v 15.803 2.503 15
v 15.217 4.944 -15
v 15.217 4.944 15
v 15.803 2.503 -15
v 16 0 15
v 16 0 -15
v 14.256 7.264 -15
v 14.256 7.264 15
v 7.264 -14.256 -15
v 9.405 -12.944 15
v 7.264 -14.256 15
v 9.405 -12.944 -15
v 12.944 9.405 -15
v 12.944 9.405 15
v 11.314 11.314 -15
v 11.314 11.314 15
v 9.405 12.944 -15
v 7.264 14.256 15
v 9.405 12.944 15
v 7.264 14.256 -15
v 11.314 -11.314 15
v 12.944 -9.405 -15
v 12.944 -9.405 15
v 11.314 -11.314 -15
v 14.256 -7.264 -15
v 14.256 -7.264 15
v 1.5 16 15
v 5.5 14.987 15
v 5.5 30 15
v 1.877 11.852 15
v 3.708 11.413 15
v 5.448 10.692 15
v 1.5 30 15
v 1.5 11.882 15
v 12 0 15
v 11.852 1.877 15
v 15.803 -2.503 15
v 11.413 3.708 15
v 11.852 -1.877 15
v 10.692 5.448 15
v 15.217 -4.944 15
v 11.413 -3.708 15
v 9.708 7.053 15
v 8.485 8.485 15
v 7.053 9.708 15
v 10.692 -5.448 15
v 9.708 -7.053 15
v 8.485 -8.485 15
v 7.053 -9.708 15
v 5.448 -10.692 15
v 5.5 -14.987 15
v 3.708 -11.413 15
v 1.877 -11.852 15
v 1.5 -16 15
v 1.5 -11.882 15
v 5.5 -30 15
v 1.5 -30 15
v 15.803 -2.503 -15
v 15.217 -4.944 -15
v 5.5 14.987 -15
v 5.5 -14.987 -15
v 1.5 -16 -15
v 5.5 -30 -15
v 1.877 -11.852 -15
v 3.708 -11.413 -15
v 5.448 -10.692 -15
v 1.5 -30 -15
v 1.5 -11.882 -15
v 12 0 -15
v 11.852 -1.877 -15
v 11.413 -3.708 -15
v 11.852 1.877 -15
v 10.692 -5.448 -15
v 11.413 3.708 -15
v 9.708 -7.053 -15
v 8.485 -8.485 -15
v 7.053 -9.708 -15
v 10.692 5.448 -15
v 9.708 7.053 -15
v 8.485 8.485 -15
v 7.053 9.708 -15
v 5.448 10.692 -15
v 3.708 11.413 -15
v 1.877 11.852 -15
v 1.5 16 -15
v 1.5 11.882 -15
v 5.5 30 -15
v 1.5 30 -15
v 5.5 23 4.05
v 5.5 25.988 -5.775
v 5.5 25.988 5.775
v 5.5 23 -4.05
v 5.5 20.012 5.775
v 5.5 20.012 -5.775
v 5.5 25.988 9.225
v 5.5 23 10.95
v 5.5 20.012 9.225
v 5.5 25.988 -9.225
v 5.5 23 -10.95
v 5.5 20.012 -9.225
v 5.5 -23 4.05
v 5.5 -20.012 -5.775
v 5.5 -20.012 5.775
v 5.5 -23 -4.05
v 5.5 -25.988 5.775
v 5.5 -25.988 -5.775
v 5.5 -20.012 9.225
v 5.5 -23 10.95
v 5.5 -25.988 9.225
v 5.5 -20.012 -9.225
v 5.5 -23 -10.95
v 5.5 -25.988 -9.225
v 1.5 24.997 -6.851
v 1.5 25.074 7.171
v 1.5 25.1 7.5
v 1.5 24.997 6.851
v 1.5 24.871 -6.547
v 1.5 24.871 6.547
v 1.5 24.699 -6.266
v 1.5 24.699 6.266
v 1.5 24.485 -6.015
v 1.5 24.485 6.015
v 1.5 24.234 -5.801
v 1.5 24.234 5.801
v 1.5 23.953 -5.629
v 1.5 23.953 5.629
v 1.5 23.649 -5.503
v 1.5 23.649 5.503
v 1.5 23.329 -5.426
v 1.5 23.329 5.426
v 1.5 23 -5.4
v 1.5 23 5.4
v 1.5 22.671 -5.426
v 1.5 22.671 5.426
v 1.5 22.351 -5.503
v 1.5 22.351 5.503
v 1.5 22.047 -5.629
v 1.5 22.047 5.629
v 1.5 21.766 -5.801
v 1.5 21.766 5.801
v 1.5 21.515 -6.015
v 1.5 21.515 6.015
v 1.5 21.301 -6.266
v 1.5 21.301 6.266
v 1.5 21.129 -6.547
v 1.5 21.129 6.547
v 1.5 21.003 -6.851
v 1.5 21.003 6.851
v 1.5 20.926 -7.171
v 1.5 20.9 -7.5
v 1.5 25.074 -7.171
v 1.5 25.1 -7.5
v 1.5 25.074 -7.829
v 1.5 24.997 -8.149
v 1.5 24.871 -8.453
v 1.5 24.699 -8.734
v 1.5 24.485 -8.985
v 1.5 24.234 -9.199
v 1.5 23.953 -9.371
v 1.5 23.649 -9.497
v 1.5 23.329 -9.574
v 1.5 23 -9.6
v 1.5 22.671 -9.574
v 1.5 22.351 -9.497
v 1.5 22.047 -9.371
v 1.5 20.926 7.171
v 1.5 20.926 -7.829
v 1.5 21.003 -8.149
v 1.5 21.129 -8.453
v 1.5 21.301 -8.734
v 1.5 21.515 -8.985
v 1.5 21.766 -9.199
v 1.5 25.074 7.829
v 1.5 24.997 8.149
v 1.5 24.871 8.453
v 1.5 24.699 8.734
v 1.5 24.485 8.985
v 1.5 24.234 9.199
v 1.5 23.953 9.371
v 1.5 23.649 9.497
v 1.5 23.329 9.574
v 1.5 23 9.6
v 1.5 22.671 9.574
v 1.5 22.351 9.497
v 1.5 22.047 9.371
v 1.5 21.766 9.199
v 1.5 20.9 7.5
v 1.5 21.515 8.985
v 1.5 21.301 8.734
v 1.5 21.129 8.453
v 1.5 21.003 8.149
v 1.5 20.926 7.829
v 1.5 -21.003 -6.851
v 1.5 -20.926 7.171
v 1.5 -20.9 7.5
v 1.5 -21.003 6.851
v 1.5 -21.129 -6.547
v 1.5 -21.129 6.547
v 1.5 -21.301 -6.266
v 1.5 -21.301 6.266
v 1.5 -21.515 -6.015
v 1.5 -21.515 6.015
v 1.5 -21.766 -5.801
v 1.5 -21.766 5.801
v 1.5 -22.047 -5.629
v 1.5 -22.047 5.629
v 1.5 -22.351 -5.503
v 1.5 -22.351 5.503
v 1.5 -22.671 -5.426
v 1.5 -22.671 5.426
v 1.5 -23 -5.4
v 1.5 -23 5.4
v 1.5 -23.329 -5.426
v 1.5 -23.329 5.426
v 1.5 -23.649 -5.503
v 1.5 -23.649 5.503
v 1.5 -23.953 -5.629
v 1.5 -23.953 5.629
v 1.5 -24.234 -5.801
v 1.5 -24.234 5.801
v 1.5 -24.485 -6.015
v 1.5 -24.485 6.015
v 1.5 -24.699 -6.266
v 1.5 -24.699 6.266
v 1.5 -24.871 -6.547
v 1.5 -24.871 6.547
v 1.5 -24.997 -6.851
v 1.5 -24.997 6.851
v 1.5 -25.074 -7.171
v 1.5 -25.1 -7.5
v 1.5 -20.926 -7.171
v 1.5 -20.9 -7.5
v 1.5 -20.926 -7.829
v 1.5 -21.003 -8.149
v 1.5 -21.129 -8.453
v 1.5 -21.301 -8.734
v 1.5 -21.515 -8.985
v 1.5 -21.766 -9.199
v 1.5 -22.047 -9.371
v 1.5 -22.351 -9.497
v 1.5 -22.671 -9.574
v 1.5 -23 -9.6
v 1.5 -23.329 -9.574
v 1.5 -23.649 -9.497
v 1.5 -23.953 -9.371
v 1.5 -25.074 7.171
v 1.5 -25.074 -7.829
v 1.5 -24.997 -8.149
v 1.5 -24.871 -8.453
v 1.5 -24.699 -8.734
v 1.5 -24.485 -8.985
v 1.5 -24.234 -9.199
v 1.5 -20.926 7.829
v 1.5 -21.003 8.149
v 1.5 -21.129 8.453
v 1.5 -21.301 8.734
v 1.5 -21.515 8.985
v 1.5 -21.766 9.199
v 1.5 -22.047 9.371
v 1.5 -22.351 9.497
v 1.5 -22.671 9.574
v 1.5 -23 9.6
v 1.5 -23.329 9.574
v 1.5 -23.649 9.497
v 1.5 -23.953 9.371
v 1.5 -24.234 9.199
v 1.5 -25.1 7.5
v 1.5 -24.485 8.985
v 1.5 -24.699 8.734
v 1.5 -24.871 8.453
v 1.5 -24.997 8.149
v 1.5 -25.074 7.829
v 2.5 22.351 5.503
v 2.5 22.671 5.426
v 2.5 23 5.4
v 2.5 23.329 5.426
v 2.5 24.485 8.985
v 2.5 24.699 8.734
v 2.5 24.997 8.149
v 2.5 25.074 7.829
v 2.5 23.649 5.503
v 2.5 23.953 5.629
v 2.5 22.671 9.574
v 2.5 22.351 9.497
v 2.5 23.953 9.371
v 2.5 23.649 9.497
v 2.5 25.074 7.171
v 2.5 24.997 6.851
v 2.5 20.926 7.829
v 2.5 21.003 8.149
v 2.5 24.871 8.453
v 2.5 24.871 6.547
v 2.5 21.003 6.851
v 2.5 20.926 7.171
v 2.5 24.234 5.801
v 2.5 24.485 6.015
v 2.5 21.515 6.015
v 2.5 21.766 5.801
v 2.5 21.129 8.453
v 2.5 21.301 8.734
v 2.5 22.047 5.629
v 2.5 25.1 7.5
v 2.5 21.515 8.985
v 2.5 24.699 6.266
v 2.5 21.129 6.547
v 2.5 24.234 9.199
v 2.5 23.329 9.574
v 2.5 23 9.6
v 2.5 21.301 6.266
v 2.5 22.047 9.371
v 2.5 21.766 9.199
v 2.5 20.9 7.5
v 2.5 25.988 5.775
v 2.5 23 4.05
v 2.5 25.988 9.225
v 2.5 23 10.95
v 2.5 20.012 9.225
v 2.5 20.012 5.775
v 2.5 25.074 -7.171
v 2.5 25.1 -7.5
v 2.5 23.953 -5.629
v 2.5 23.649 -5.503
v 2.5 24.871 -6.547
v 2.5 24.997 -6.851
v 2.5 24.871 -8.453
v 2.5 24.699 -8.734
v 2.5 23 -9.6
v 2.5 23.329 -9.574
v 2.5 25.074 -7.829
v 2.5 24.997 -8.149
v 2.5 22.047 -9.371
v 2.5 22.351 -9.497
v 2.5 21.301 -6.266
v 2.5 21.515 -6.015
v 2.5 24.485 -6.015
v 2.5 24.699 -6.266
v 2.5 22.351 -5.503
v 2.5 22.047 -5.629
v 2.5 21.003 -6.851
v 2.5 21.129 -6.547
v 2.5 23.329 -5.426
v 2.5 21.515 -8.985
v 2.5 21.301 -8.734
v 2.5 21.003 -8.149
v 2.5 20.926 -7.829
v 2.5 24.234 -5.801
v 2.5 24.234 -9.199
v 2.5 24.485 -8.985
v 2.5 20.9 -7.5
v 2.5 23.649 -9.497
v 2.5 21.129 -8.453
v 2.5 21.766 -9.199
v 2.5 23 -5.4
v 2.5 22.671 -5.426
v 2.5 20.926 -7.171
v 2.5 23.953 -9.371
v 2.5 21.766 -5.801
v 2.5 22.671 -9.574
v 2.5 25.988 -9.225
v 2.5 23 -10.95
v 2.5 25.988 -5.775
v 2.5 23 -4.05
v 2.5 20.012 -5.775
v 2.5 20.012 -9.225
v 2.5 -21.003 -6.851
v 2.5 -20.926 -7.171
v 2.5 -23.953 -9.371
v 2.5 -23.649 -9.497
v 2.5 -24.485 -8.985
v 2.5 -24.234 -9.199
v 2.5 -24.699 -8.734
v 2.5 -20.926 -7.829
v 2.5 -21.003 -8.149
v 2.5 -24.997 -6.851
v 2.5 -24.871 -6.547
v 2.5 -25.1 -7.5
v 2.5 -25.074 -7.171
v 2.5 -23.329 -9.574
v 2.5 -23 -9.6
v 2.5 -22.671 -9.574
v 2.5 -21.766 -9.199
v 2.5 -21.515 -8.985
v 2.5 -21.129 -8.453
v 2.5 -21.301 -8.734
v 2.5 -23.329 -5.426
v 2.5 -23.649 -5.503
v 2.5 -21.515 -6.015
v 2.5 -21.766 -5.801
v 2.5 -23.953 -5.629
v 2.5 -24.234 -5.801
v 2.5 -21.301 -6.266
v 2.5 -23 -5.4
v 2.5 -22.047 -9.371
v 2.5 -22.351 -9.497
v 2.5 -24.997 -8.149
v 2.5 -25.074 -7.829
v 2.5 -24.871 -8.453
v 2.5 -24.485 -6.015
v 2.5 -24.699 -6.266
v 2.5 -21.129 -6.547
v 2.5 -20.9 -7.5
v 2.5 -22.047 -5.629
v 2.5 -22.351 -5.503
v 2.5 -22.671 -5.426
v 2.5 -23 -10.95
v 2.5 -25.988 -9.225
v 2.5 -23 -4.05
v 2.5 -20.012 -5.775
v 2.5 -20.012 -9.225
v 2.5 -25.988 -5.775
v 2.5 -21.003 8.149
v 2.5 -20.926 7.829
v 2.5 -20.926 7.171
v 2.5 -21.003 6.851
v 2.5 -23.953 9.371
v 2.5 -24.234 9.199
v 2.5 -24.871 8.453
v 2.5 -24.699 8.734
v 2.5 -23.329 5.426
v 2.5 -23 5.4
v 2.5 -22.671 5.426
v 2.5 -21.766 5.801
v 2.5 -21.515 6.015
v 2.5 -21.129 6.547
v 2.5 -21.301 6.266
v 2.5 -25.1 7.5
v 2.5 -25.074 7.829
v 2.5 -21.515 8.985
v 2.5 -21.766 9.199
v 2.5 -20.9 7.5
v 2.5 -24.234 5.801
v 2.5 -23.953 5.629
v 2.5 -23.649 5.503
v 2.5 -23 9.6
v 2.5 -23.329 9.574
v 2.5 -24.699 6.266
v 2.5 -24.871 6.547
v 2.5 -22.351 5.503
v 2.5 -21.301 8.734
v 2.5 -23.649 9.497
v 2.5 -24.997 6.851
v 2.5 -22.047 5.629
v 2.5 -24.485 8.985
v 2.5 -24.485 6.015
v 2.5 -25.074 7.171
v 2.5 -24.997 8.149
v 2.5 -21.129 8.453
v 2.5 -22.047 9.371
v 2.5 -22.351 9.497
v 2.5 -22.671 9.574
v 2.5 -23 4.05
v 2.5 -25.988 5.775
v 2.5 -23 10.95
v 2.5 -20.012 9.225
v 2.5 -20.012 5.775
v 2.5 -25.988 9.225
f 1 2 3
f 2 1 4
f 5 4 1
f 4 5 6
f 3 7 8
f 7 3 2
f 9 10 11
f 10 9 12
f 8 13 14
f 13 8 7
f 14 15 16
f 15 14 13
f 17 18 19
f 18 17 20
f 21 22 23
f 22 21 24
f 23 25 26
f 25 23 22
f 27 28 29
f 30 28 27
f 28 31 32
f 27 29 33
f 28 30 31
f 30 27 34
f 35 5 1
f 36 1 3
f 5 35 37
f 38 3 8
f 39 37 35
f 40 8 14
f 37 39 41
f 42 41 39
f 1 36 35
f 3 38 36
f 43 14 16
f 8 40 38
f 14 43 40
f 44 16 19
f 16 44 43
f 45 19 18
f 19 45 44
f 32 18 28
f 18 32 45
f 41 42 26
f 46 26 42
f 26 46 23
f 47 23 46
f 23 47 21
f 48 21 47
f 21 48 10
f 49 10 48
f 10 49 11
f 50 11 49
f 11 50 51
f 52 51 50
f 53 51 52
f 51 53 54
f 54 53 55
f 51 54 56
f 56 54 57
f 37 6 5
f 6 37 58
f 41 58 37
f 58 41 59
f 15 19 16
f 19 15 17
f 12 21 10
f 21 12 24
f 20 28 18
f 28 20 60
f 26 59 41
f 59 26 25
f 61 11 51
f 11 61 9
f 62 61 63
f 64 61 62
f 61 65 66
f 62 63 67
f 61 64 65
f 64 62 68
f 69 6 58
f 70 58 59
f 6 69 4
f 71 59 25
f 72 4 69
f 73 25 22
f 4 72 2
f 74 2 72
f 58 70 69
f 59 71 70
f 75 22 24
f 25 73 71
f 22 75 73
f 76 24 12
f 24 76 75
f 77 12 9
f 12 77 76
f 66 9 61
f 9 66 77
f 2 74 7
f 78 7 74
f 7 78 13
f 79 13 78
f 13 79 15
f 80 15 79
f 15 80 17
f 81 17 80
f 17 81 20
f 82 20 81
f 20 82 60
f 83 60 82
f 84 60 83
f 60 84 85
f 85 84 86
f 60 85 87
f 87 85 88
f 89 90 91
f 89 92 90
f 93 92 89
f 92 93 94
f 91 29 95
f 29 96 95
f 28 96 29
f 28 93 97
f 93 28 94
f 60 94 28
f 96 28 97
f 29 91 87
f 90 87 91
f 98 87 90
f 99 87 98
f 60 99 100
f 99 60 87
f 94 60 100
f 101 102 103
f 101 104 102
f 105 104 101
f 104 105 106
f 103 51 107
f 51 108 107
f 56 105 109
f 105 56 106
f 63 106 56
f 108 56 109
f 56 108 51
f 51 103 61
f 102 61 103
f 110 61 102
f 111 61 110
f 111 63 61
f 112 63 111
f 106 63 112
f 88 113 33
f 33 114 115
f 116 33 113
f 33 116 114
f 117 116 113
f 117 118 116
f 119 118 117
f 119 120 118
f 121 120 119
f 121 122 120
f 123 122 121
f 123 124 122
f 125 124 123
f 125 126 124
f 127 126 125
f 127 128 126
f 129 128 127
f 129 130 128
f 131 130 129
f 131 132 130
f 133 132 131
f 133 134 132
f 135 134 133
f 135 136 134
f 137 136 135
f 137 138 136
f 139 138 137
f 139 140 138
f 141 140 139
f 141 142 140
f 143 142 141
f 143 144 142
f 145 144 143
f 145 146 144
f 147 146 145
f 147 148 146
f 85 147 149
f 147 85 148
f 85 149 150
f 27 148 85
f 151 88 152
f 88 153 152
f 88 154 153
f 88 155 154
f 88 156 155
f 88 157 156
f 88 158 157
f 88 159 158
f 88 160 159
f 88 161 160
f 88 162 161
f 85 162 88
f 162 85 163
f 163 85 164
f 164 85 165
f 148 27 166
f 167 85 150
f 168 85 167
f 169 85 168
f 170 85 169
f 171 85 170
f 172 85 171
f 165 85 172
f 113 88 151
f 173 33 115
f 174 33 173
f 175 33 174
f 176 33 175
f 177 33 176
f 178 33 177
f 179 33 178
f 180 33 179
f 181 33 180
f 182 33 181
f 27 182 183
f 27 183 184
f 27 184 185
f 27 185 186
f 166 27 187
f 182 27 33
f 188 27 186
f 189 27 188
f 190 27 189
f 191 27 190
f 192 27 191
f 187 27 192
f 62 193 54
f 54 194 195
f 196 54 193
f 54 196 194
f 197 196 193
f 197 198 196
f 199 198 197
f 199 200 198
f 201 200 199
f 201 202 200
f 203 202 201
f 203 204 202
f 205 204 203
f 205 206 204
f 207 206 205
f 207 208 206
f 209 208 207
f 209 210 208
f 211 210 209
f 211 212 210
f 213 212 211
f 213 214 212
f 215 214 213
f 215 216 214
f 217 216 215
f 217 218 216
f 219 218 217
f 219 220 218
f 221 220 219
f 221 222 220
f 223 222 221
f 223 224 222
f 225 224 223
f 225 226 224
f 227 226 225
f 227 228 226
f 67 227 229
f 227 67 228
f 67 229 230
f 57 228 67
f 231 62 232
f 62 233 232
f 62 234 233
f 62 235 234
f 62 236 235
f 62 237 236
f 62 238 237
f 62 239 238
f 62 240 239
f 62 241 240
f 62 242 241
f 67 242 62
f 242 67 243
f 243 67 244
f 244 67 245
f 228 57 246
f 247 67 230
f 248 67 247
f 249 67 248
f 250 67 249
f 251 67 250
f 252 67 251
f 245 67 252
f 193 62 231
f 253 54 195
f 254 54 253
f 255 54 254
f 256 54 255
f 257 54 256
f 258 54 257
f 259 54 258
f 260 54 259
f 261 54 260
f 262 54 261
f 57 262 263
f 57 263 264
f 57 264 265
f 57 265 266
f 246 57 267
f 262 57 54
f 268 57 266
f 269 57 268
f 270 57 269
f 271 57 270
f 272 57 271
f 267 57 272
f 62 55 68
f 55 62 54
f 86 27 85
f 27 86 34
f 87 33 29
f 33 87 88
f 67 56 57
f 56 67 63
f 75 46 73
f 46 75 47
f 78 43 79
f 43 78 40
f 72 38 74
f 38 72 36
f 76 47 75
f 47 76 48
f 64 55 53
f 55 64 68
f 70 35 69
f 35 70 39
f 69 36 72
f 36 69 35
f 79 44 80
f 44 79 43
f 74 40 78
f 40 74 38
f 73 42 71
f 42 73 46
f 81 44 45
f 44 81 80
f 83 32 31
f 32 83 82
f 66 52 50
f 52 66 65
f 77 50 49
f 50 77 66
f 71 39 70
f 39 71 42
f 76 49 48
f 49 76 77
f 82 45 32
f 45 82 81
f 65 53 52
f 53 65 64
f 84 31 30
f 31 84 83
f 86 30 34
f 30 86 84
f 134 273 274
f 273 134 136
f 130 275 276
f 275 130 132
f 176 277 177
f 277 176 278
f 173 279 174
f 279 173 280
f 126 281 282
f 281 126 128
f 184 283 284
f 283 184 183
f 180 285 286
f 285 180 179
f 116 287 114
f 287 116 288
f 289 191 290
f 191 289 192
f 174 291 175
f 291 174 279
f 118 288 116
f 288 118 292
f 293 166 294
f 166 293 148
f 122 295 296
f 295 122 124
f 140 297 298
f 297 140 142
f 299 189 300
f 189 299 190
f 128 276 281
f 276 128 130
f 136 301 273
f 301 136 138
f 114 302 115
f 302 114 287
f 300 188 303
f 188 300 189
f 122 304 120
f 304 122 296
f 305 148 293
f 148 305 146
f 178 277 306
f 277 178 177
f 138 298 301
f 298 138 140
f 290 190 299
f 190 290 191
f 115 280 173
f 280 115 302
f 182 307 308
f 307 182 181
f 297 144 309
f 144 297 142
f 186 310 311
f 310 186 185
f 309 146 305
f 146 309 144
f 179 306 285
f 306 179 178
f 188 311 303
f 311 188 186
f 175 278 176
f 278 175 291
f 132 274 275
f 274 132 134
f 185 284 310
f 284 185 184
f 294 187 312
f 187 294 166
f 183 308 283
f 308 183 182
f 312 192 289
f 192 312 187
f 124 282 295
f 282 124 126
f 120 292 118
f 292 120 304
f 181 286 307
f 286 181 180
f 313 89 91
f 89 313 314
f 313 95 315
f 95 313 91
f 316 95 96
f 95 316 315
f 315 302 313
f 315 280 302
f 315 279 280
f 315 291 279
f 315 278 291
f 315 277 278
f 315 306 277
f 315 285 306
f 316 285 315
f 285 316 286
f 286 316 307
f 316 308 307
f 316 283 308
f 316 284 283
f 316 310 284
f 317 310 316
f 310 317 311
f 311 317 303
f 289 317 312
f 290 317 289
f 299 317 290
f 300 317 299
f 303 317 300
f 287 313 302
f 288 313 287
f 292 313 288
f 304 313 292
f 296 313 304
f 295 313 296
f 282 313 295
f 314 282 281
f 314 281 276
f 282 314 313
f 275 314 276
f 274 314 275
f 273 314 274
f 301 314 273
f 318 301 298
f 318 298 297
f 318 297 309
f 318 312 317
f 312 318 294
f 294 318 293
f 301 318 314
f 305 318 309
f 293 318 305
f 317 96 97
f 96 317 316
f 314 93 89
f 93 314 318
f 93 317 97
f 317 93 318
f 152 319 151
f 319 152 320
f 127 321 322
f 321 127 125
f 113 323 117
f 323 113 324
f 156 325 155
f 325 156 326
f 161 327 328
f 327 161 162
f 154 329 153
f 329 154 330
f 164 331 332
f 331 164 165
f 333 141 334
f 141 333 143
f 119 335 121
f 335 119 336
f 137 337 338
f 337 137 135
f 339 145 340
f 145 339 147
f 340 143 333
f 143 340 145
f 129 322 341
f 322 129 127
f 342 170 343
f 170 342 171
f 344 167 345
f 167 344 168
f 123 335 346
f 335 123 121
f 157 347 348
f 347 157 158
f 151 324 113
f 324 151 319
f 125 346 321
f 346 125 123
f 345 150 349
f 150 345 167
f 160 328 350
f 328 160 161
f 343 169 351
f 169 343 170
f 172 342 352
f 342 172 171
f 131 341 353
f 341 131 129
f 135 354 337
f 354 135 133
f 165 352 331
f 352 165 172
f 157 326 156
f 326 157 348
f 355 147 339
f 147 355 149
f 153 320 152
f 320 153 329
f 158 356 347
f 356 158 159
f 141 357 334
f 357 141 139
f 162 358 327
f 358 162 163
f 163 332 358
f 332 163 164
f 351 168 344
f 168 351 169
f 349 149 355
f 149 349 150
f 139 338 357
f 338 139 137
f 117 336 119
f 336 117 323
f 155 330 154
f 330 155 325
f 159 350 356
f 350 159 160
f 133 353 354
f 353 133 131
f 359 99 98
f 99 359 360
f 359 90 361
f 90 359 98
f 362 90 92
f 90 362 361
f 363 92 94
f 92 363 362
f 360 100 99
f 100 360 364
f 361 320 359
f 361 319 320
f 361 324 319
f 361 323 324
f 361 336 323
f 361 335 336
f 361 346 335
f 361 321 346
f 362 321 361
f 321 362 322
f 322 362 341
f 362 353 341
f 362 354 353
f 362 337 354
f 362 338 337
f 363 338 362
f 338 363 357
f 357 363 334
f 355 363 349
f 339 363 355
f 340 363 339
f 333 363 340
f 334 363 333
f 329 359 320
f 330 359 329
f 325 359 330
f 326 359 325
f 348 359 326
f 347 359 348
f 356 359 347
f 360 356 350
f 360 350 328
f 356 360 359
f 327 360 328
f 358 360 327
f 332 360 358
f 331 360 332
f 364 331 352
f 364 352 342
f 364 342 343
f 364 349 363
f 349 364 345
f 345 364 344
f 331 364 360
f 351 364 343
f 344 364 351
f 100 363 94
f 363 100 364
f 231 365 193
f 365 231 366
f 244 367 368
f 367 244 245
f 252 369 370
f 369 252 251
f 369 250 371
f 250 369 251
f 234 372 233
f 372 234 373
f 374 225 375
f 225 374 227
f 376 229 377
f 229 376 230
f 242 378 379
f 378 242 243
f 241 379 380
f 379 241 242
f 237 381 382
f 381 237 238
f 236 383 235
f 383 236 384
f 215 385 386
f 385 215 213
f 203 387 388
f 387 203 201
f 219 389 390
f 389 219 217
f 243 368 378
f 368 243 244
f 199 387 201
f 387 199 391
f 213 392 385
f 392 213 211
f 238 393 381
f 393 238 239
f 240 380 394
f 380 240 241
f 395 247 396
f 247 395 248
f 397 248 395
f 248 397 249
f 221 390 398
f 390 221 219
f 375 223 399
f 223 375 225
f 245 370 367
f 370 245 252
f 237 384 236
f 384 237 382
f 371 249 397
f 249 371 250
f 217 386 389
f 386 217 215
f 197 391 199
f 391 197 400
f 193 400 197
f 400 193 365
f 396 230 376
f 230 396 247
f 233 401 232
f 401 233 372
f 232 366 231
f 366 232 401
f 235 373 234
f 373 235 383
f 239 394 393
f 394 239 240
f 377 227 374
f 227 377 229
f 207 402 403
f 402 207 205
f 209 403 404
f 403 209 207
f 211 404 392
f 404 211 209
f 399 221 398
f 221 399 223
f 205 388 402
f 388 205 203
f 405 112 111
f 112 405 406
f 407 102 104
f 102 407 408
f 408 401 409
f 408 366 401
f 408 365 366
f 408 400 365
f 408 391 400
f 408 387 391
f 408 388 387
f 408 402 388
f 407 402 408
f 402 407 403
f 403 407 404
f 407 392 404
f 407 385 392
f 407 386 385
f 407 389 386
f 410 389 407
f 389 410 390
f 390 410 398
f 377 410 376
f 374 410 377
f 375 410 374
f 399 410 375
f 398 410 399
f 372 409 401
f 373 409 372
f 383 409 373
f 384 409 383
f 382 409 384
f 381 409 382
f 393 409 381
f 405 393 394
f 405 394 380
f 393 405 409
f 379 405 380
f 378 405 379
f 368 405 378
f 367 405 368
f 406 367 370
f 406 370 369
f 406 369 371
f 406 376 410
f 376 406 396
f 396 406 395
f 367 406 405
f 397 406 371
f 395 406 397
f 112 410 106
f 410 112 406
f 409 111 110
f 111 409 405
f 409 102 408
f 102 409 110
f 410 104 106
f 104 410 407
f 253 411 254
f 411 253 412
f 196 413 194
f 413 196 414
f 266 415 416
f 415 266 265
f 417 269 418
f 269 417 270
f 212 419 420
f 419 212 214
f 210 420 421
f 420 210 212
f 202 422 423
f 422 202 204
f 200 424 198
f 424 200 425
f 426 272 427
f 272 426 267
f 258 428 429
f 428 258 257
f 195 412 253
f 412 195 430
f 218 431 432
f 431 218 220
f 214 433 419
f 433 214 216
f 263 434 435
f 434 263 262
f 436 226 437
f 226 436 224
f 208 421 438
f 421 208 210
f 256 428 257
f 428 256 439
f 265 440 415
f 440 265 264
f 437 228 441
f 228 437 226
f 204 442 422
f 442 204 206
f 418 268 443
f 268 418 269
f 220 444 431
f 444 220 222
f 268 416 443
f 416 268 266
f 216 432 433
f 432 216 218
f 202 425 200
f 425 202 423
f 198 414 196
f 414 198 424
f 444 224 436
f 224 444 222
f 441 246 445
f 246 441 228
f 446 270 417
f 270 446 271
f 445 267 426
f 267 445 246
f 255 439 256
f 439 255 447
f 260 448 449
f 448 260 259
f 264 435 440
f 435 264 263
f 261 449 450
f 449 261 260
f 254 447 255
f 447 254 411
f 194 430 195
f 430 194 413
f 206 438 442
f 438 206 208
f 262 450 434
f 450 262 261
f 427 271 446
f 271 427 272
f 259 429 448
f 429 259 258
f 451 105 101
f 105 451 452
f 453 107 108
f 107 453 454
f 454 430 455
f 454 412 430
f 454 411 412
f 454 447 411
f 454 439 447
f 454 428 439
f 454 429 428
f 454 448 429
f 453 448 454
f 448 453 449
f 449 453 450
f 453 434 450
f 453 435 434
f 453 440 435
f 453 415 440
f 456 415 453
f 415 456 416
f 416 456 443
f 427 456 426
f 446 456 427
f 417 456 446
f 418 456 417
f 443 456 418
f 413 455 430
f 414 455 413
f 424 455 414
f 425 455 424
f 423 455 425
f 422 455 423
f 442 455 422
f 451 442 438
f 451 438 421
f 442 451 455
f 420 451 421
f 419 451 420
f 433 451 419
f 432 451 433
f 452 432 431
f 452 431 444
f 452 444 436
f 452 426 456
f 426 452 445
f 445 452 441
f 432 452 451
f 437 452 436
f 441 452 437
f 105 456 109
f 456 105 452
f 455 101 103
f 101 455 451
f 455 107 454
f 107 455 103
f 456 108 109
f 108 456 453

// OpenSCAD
// file: ../configuration.scad
$fn=40; // model faces resolution.

//OBECNE PARAMETRY 
//----------------------------------------------------------------
//----------------------------------------------------------------
//WINDGAUGE02A_S02 - Parametry pro hlavni valec anemometru
S01_hloubka_zavitu=4;
S01_vyska=95; //80
S01_prumer_vnitrni=45;
S01_prumer_vnitrniB=30;
S01_prechod_vyska=45;
S01_prechod_delka=30;
S01_sila_materialu=1.3;
S01_vyska_horni_zavit=10;
S01_vyska_spodniho_zavitu=10;
S01_sila_drzaku_RJ11=3; //vyška drážky
S01_hrana_A_RJ11=12.3;
S01_hrana_B_RJ11=19;
S01_tolerance_zavit=1.5;

//Obecné parametry
prumer_osicky=5;
sterbina_na_osicku=0.5; //aby nepraskal a držel držák rotoru na hřídelce

//Rozmery modulu pro lozisko
senzor_delka=10.16*4;
senzor_sirka=10.16*3;
senzor_vyska_IO=2;
senzor_odstup_od_magnetu=2;

//Parametry loziska
lozisko_prumer_vnitrni=4.9;
lozisko_prumer_vnejsi=16.15;
lozisko_vyska=5*2;
lozisko_prekryv=1.5;

//Parametry magnetu
magnet_pocet=3;
magnet_prumer=6.3;
magnet_vyska=3;
magnet_zapusteni=2;
magnet_tolerance_prumeru=0.2;
magnet_vzdalenost = 9; // vzdalenost magnetu od stredu

R03_vyska_narezeni_hridelky=5;

//Parametry sroubu
prumer_sroubu=3.4;
prumer_hlavy_sroubu=6;
vyska_hlavy_sroubu=4;
vyska_matky=3;
sirka_matky=6.7;

sirka_matky_tol=0.175;
prumer_orechu=10;

//WINDGAUGE02A_R01 //pro lopatku
L01_hrana_drzaku_a=10;
L01_hrana_drzaku_b=3;
L01_delka_uchytu=25;
L01_prumer_lopatky=40;
L01_sila_materialu_lopatky=1.2;

//WINDGAUGE02A_D01 //uchyt velky
D01_material_pod_zavitem=5;
D01_material_za_zavitem=3;
D01_material_pred_zavitem=2;
D01_delka_tyce=60;
D01_sirka_tyce=10;

//WINDGAUGE02A_D02 //uchyt na sloup
D02_sila_materialu=4;
D02_vyska_uchytky=30;
D02_prumer_obruby=24; 

//27mm - 3/4 trubka
D02_delka_celeho_uchytu=60;
D02_dotahova_vzdalenost=1.5;
D02_prumer_uchytneho_sroubu=4.2;
//D02_sirka_matky=9.1; //pro M4
//D02_vyska_matky=3;
D02_sirka_matky= sirka_matky; //pro M3
D02_vyska_matky= vyska_matky;

//WINDGAUGE02A_R01 //rotor s prekritim statoru
R01_vyska_preryti_statoru=10;
R01_sila_materialu_pro_prekriti=1.3;
R01_mezera_mezi_statorem_rotorem=3;

//WINDGAUGE02A_R03 //drzak magnetu
R05_sirka_matky=10;
// main file
$fn=40; // model faces resolution.
include <../configuration.scad>


//Drzak na sloup - cast bez drzaku anemometru
module WINDGAUGE02A_D02(){
	
difference()
    {
    union()
        {
        //základní válec
        cylinder(h=D02_vyska_uchytky,r=(D02_prumer_obruby+2*D02_sila_materialu)/2,center=true);
		//úchytové plošky		
        translate([D02_dotahova_vzdalenost+D02_sila_materialu/2,0,0]){cube([D02_sila_materialu,D02_delka_celeho_uchytu,D02_vyska_uchytky],center=true);}
		}
    
    //válec na odečet
    cylinder(h=D02_vyska_uchytky+0.01,r=D02_prumer_obruby/2,center=true);     
	        
    //kvádr na odecet
	translate([D02_dotahova_vzdalenost-(D02_prumer_obruby+2*D02_sila_materialu)/2,0,0]){cube([D02_prumer_obruby+2*D02_sila_materialu,D02_prumer_obruby+2*D02_sila_materialu,D02_vyska_uchytky+0.01],center=true);}
		
	//otvory na sroub
	translate([D02_dotahova_vzdalenost,(D02_delka_celeho_uchytu/2-D02_prumer_obruby/2-D02_sila_materialu)/2+D02_prumer_obruby/2+D02_sila_materialu,D02_vyska_uchytky/4]){rotate([0,90,0]){cylinder(h=D02_sila_materialu+0.01,r=D02_prumer_uchytneho_sroubu/2);}}
    
     //drzak matky
    translate([D02_dotahova_vzdalenost+D02_sila_materialu-D02_vyska_matky,(D02_delka_celeho_uchytu/2-D02_prumer_obruby/2-D02_sila_materialu)/2+D02_prumer_obruby/2+D02_sila_materialu,D02_vyska_uchytky/4]){rotate([0,90,0]){ cylinder (h = D02_vyska_matky+0.01, r= (D02_sirka_matky+0.2)/2, $fn=6);}}
   
     
        
    translate([D02_dotahova_vzdalenost,(D02_delka_celeho_uchytu/2-D02_prumer_obruby/2-D02_sila_materialu)/2+D02_prumer_obruby/2+D02_sila_materialu,-D02_vyska_uchytky/4]){rotate([0,90,0]){cylinder(h=D02_sila_materialu+0.01,r=D02_prumer_uchytneho_sroubu/2);}}
    
     //drzak matky
    translate([D02_dotahova_vzdalenost+D02_sila_materialu-D02_vyska_matky,(D02_delka_celeho_uchytu/2-D02_prumer_obruby/2-D02_sila_materialu)/2+D02_prumer_obruby/2+D02_sila_materialu,-D02_vyska_uchytky/4]){rotate([0,90,0]){ cylinder (h = D02_vyska_matky+0.01, r= (D02_sirka_matky+0.2)/2, $fn=6);}}
        
	translate([D02_dotahova_vzdalenost,-((D02_delka_celeho_uchytu/2-D02_prumer_obruby/2-D02_sila_materialu)/2+D02_prumer_obruby/2+D02_sila_materialu),-D02_vyska_uchytky/4]){rotate([0,90,0]){cylinder(h=D02_sila_materialu+0.01,r=D02_prumer_uchytneho_sroubu/2);}}
    
     //drzak matky
    translate([D02_dotahova_vzdalenost+D02_sila_materialu-D02_vyska_matky,-((D02_delka_celeho_uchytu/2-D02_prumer_obruby/2-D02_sila_materialu)/2+D02_prumer_obruby/2+D02_sila_materialu),-D02_vyska_uchytky/4]){rotate([0,90,0]){ cylinder (h = D02_vyska_matky+0.01, r= (D02_sirka_matky+0.2)/2, $fn=6);}}

    translate([D02_dotahova_vzdalenost,-((D02_delka_celeho_uchytu/2-D02_prumer_obruby/2-D02_sila_materialu)/2+D02_prumer_obruby/2+D02_sila_materialu),D02_vyska_uchytky/4]){rotate([0,90,0]){cylinder(h=D02_sila_materialu+0.01,r=D02_prumer_uchytneho_sroubu/2);}}	
    
     //drzak matky
    translate([D02_dotahova_vzdalenost+D02_sila_materialu-D02_vyska_matky,-((D02_delka_celeho_uchytu/2-D02_prumer_obruby/2-D02_sila_materialu)/2+D02_prumer_obruby/2+D02_sila_materialu),D02_vyska_uchytky/4]){rotate([0,90,0]){ cylinder (h = D02_vyska_matky+0.01, r= (D02_sirka_matky+0.2)/2, $fn=6);}}
	
    }
}

module WINDGAUGE02A_D02_2(){
	
difference()
    {
    union()
        {
        //základní válec
        cylinder(h=D02_vyska_uchytky,r=(D02_prumer_obruby+2*D02_sila_materialu)/2,center=true);
		//úchytové plošky		
        translate([D02_dotahova_vzdalenost+D02_sila_materialu/2,0,0]){cube([D02_sila_materialu,D02_delka_celeho_uchytu,D02_vyska_uchytky],center=true);}
		}
    
    //válec na odečet
    cylinder(h=D02_vyska_uchytky+0.01,r=D02_prumer_obruby/2,center=true);     
	        
    //kvádr na odecet
	translate([D02_dotahova_vzdalenost-(D02_prumer_obruby+2*D02_sila_materialu)/2,0,0]){cube([D02_prumer_obruby+2*D02_sila_materialu,D02_prumer_obruby+2*D02_sila_materialu,D02_vyska_uchytky+0.01],center=true);}
		
	//otvory na sroub
	translate([D02_dotahova_vzdalenost,(D02_delka_celeho_uchytu/2-D02_prumer_obruby/2-D02_sila_materialu)/2+D02_prumer_obruby/2+D02_sila_materialu,D02_vyska_uchytky/4]){rotate([0,90,0]){cylinder(h=D02_sila_materialu+0.01,r=D02_prumer_uchytneho_sroubu/2);}}
    
    
   
     
        
    translate([D02_dotahova_vzdalenost,(D02_delka_celeho_uchytu/2-D02_prumer_obruby/2-D02_sila_materialu)/2+D02_prumer_obruby/2+D02_sila_materialu,-D02_vyska_uchytky/4]){rotate([0,90,0]){cylinder(h=D02_sila_materialu+0.01,r=D02_prumer_uchytneho_sroubu/2);}}
    
     
        
	translate([D02_dotahova_vzdalenost,-((D02_delka_celeho_uchytu/2-D02_prumer_obruby/2-D02_sila_materialu)/2+D02_prumer_obruby/2+D02_sila_materialu),-D02_vyska_uchytky/4]){rotate([0,90,0]){cylinder(h=D02_sila_materialu+0.01,r=D02_prumer_uchytneho_sroubu/2);}}
    
    

    translate([D02_dotahova_vzdalenost,-((D02_delka_celeho_uchytu/2-D02_prumer_obruby/2-D02_sila_materialu)/2+D02_prumer_obruby/2+D02_sila_materialu),D02_vyska_uchytky/4]){rotate([0,90,0]){cylinder(h=D02_sila_materialu+0.01,r=D02_prumer_uchytneho_sroubu/2);}}	
    
    
	
    }
}


WINDGAUGE02A_D02();
